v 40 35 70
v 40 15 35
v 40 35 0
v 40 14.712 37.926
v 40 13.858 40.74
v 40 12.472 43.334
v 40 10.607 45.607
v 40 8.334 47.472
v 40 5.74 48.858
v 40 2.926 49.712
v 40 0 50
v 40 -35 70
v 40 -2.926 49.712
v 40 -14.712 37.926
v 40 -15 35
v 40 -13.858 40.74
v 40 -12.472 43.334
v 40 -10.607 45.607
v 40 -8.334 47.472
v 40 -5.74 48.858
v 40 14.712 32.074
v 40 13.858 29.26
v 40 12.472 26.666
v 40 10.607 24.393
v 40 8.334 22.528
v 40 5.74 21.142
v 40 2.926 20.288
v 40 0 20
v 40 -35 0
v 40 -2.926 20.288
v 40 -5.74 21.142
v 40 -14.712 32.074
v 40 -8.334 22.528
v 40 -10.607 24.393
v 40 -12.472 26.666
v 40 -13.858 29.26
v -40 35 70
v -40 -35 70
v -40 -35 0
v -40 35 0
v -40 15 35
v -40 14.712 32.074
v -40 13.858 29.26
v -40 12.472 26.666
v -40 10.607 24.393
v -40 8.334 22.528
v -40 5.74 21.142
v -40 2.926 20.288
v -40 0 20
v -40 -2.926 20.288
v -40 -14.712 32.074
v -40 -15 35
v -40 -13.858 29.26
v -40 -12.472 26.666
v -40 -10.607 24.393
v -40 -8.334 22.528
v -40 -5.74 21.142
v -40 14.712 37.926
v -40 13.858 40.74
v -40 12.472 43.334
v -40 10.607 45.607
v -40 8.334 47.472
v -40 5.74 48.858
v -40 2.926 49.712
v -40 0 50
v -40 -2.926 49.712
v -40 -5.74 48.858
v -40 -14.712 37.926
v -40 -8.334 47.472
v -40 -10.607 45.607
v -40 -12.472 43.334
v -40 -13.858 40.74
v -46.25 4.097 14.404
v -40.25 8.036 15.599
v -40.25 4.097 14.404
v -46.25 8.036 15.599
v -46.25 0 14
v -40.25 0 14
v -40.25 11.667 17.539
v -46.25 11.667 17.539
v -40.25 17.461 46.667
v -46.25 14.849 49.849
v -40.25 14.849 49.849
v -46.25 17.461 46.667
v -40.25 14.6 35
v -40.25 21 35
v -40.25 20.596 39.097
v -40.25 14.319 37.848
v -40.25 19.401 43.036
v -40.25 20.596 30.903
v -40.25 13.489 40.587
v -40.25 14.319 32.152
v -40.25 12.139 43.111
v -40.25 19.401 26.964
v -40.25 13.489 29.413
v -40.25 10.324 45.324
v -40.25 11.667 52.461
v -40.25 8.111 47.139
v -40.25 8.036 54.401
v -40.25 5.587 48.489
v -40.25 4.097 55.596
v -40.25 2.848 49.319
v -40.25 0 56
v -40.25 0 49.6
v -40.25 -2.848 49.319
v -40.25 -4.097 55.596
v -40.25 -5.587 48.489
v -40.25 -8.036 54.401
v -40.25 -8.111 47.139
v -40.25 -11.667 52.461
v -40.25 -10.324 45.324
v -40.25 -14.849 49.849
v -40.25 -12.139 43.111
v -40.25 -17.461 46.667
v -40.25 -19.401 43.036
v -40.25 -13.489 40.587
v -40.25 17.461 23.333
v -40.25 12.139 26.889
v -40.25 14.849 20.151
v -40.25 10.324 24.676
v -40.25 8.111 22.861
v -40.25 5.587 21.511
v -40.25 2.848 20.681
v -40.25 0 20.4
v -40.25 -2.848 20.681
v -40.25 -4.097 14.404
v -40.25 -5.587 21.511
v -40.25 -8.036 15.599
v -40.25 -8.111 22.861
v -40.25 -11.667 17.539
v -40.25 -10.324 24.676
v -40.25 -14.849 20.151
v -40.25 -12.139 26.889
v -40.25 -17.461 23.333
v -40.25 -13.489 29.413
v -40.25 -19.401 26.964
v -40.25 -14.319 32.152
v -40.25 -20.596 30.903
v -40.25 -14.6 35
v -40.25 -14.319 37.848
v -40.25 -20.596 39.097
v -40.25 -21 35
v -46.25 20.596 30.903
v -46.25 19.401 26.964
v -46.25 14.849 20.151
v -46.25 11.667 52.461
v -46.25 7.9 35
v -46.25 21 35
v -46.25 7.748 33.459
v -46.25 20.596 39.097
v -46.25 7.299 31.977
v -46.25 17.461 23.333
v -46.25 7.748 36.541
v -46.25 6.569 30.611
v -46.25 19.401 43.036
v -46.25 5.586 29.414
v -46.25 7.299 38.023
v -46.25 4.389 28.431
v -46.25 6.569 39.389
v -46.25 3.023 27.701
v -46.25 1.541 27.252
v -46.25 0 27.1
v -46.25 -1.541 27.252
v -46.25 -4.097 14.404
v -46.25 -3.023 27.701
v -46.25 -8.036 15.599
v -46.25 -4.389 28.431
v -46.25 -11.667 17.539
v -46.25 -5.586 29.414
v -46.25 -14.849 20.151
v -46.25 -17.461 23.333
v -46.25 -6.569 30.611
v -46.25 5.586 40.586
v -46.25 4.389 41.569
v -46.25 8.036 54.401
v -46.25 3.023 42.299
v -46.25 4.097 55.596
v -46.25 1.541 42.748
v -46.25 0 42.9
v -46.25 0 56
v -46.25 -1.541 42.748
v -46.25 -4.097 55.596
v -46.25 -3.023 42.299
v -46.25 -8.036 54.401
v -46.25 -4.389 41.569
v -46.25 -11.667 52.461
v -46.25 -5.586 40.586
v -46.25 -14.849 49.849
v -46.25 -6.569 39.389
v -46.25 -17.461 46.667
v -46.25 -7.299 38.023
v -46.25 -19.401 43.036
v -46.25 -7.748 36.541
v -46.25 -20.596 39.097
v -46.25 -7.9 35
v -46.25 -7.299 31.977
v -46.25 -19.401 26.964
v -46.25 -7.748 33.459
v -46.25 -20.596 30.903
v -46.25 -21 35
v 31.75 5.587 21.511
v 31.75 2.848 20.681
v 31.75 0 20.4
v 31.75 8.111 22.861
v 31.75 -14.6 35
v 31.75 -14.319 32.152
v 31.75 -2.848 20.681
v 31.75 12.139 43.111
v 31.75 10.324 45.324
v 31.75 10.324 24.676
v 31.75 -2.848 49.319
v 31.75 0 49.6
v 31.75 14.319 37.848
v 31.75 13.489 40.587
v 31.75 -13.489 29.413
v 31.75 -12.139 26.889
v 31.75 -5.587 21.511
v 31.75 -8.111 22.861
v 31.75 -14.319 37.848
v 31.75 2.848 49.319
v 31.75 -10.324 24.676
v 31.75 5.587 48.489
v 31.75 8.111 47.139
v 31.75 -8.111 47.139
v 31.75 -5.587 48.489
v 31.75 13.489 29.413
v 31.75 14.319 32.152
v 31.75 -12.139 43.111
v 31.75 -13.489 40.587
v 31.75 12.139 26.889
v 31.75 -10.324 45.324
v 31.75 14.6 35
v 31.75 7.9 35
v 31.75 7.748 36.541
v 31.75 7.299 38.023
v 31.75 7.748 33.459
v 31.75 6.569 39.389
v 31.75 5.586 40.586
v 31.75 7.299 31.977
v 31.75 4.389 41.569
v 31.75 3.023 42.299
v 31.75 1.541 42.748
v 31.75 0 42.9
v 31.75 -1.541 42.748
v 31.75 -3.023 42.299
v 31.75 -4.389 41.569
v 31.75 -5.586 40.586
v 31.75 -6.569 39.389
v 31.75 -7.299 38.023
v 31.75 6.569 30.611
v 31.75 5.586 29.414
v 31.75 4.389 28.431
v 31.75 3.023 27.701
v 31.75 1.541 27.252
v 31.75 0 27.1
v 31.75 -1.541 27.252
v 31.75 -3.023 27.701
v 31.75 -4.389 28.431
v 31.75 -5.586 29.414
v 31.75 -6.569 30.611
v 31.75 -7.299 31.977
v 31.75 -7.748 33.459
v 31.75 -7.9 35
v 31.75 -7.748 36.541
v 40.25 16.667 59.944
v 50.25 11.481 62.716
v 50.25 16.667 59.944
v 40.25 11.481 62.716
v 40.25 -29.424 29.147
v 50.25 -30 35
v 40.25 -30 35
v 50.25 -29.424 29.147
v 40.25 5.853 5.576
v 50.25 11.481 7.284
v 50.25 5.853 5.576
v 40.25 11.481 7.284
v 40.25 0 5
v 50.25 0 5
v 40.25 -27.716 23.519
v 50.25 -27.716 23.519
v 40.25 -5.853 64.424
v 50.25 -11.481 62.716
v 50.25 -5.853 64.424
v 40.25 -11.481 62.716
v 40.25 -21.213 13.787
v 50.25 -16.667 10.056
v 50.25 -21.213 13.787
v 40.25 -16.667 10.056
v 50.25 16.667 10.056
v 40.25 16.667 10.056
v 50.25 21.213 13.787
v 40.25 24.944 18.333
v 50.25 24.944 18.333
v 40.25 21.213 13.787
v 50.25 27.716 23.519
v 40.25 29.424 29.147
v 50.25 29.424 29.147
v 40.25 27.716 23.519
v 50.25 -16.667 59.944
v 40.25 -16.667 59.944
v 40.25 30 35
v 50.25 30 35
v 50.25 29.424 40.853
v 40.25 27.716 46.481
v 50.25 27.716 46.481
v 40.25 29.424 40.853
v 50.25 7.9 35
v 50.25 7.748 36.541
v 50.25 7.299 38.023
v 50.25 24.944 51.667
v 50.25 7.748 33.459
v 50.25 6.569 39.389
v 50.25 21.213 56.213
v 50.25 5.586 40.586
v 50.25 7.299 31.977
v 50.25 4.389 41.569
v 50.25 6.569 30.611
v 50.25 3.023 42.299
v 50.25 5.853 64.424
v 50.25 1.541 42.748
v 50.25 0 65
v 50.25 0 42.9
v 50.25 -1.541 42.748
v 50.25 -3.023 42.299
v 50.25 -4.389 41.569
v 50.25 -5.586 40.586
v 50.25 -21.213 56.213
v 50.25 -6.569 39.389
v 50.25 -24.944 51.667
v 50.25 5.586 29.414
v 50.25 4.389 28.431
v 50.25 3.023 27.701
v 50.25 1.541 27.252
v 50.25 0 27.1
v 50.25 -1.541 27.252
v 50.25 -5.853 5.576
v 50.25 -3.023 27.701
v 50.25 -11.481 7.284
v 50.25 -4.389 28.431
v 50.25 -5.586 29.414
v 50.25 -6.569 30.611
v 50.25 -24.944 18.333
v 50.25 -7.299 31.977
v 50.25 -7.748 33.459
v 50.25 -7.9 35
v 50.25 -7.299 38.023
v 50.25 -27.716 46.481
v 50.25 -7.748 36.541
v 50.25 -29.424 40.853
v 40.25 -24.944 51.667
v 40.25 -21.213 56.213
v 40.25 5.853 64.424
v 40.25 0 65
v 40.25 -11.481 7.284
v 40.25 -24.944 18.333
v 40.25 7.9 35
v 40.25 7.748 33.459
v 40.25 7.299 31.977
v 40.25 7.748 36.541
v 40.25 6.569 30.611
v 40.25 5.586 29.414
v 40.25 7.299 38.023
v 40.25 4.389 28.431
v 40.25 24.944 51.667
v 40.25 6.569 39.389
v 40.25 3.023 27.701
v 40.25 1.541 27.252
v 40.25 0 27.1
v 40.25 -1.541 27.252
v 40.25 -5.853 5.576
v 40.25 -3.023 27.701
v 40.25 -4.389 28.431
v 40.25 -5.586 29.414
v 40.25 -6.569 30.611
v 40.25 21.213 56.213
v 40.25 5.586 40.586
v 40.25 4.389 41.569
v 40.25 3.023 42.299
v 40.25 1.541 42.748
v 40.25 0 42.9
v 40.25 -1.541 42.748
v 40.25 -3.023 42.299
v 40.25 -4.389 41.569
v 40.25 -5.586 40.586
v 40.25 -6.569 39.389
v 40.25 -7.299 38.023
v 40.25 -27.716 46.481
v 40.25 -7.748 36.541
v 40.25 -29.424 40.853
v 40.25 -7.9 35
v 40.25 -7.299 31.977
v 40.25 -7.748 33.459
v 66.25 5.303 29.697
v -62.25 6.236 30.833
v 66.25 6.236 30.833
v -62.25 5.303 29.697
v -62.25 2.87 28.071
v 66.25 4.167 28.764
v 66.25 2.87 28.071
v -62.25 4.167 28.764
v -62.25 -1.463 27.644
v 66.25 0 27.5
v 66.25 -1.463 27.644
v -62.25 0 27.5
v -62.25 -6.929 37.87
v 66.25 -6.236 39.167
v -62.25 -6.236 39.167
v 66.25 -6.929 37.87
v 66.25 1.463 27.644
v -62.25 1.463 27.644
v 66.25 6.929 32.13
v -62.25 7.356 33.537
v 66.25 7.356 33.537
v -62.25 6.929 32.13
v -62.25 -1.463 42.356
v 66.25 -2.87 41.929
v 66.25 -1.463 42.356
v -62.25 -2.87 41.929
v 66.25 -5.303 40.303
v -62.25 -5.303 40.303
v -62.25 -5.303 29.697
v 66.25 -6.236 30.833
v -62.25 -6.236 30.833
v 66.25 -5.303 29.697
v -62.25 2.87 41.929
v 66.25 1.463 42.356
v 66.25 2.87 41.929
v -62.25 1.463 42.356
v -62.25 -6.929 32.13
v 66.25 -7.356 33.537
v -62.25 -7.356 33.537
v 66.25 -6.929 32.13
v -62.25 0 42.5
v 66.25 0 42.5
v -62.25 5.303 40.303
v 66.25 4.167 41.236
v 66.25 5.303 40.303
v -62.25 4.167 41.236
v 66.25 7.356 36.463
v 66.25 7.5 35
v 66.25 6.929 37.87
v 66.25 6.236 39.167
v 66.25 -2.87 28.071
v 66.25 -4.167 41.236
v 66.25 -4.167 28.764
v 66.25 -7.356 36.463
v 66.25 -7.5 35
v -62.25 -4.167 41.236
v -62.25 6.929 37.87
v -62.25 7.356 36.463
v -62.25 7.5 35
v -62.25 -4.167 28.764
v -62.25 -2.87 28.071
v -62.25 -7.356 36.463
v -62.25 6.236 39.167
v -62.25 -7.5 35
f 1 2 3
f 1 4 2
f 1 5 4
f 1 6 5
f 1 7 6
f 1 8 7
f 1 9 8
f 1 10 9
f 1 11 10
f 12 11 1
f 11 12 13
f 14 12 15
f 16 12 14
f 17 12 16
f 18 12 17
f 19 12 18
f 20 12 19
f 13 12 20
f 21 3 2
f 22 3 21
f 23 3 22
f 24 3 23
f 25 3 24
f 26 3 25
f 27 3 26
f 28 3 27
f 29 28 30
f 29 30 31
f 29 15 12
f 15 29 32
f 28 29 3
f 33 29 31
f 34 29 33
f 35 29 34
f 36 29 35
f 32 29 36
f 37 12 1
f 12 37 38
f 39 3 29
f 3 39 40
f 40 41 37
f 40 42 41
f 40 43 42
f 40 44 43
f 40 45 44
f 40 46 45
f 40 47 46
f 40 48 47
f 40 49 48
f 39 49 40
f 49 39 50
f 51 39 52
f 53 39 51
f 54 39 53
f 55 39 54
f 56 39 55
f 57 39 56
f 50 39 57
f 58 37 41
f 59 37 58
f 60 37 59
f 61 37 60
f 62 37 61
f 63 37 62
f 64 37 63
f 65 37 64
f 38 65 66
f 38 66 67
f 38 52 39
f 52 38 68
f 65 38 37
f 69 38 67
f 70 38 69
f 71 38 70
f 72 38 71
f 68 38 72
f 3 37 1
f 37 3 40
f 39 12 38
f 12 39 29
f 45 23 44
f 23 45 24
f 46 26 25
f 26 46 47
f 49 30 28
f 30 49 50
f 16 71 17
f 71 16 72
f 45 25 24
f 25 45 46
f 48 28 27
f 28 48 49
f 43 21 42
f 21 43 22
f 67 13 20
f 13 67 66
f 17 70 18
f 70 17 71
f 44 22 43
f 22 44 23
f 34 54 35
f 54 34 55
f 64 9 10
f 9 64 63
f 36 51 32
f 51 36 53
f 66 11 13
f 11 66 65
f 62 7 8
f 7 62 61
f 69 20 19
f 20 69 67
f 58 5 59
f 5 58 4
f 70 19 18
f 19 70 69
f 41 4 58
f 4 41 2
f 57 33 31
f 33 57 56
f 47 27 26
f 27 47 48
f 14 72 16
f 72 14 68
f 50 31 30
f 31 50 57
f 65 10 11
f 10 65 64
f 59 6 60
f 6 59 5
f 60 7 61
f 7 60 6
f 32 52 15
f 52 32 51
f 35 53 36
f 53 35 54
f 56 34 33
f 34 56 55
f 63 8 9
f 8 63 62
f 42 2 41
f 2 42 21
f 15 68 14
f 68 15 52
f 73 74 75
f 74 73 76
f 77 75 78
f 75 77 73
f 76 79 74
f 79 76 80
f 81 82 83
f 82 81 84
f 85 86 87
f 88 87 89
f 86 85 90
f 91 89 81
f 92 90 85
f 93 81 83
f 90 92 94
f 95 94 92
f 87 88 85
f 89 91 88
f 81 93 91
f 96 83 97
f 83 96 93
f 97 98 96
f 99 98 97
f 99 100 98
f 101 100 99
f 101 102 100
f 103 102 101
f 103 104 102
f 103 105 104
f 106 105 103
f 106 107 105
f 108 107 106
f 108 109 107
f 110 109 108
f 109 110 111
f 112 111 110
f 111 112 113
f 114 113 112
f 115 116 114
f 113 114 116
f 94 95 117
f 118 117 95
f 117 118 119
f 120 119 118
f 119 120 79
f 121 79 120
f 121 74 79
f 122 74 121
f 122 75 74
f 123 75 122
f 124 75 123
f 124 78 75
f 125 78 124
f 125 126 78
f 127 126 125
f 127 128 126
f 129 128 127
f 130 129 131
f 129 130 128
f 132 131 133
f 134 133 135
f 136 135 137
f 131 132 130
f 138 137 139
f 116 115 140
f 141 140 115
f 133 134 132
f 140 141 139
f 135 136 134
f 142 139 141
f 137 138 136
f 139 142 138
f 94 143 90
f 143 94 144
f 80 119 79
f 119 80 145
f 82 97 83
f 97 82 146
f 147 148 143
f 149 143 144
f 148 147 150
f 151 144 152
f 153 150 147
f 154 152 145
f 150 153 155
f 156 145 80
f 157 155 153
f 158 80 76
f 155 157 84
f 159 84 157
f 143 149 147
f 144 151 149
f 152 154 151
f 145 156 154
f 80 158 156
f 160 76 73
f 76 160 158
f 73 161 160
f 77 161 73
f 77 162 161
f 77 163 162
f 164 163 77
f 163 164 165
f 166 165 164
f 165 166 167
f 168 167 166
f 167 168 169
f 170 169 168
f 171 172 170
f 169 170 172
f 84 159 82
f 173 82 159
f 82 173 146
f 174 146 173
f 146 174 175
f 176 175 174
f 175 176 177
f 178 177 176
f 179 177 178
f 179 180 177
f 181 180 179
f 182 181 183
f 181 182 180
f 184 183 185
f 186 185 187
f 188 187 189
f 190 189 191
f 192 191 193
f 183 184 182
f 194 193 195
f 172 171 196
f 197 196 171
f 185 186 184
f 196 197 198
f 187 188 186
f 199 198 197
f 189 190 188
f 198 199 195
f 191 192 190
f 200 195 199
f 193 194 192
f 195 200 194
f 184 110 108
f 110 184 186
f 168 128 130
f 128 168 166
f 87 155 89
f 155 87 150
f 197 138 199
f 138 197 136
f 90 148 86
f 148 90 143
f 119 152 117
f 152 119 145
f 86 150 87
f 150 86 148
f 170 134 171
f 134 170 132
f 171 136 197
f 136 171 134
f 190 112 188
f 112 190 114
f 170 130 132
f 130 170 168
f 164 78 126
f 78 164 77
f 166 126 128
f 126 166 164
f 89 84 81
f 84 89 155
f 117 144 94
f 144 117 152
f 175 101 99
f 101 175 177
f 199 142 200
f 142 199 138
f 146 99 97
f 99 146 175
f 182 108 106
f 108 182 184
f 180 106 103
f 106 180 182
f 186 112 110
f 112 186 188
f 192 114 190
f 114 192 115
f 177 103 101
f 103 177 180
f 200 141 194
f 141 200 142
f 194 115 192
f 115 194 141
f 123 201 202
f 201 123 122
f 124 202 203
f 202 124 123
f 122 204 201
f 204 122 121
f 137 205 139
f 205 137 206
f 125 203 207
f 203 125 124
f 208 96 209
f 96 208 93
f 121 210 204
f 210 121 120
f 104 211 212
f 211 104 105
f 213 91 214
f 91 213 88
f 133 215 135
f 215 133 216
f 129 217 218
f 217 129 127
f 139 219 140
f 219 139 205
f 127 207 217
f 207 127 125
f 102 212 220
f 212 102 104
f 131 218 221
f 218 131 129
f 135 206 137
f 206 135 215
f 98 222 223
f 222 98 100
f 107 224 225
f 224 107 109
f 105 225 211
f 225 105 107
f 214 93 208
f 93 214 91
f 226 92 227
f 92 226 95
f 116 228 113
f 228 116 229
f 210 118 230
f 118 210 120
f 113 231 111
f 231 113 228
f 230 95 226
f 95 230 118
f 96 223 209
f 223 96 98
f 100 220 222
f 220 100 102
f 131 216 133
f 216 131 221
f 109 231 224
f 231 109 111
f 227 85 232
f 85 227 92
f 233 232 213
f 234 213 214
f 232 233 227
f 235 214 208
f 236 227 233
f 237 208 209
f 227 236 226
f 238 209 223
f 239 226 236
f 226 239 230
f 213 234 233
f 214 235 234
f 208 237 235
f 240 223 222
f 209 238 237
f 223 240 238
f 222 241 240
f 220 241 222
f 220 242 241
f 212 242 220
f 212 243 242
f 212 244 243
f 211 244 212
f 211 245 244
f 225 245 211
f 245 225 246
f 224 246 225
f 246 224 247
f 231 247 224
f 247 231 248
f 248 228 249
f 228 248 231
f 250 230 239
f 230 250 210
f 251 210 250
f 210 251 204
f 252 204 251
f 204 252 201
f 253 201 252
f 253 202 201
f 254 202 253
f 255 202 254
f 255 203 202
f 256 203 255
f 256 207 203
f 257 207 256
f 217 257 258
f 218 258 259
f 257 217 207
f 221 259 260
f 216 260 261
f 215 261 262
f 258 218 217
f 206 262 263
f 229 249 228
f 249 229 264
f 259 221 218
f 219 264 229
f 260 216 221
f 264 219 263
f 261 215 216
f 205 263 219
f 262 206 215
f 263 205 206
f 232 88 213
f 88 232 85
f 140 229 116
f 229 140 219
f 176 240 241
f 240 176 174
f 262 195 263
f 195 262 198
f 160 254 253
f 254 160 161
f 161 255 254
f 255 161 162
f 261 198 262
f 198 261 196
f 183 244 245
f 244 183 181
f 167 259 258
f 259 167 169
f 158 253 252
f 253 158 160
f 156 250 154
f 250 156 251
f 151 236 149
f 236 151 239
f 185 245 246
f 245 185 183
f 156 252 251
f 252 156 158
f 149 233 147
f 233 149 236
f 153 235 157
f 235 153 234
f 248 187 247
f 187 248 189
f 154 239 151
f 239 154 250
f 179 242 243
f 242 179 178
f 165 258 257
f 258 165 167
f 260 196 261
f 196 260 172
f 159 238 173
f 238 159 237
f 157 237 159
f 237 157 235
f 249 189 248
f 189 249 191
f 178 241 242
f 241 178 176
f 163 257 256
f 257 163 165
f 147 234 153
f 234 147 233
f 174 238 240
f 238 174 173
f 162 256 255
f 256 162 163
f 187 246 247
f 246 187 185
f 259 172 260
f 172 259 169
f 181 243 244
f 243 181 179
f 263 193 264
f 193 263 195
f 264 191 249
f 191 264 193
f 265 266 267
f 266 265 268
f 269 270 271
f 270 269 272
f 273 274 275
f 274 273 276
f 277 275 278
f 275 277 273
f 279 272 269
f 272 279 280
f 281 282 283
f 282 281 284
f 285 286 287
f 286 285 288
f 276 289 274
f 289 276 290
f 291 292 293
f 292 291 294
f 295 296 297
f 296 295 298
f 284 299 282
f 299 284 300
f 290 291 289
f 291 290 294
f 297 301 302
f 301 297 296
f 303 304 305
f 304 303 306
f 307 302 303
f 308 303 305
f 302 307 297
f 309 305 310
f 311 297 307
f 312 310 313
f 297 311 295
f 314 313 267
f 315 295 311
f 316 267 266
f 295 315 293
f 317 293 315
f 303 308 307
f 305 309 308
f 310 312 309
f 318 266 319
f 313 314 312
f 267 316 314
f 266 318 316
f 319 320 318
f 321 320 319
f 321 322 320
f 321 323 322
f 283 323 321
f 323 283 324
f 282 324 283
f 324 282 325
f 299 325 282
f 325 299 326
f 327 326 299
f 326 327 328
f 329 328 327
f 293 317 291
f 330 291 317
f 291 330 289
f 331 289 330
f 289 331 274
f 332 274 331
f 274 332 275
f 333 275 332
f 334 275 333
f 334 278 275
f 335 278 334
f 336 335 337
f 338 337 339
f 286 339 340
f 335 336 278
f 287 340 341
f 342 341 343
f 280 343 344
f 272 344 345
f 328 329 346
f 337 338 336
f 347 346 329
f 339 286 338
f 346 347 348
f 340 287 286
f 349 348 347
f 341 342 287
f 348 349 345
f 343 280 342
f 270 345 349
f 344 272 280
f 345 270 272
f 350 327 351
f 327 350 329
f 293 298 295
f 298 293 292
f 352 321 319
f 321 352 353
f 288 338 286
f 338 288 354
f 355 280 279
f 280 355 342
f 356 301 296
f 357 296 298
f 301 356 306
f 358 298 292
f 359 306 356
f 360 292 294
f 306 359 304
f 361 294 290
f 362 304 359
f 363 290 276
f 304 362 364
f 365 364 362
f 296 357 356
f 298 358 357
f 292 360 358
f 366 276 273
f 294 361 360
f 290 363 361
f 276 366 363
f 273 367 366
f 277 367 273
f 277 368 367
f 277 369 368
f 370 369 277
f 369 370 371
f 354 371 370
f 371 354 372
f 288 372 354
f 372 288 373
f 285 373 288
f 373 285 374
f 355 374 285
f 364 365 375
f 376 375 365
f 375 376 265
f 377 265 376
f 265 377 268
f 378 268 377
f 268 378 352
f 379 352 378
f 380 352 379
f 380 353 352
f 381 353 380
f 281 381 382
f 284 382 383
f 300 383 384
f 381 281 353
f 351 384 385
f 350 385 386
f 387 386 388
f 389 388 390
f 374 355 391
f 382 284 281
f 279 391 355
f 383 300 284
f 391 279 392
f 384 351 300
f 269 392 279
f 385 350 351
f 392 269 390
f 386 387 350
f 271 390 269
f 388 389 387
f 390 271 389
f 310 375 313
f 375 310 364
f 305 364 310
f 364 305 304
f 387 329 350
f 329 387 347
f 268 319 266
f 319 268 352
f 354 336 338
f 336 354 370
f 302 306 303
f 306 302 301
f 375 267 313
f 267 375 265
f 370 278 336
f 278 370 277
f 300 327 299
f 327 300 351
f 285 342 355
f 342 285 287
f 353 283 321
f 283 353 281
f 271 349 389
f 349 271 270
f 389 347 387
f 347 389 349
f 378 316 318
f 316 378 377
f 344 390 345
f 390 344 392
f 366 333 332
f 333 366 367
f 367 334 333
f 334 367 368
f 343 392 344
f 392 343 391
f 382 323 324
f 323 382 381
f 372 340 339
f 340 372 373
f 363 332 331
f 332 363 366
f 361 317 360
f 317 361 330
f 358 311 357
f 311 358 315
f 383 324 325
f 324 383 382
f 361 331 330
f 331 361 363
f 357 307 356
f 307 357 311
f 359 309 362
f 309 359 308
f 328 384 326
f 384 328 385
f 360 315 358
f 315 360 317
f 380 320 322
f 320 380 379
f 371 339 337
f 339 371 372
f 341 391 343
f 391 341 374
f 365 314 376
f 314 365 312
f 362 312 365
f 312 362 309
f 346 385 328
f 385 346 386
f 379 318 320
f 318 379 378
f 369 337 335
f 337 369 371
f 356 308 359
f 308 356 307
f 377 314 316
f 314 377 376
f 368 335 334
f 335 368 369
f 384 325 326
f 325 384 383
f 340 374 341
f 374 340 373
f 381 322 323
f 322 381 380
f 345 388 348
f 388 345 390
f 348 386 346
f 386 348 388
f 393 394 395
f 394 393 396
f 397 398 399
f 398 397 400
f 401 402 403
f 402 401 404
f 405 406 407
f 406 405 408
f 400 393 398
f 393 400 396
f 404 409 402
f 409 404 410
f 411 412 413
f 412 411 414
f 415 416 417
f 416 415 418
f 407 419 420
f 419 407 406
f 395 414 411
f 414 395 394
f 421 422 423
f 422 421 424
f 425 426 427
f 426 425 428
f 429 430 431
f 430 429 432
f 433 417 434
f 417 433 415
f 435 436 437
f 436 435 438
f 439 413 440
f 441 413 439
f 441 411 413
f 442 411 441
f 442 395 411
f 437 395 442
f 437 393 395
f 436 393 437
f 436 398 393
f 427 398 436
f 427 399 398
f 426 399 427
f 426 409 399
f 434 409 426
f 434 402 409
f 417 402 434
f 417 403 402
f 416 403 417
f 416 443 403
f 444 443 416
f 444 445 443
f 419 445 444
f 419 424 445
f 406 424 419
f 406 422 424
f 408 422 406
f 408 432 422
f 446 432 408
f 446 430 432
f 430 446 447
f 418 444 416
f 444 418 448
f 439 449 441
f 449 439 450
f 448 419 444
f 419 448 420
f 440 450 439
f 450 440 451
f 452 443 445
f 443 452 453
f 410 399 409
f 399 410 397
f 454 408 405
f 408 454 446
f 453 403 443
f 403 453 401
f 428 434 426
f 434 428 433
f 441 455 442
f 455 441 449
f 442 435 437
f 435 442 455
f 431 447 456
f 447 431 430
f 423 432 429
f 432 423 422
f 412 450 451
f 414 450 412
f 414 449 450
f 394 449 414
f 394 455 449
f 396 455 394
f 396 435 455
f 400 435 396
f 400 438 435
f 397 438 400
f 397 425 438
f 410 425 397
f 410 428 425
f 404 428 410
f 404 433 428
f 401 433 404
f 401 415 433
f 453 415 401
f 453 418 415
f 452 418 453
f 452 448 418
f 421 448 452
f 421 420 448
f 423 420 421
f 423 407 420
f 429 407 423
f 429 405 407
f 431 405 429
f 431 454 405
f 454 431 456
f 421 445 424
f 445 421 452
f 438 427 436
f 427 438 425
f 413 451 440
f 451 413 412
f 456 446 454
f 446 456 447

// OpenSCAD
$fn = 32;

// ------------------------------------------------------------------------
// Bushed housing: 80 x 70 x 70 mm housing, bushing d29.2
// Every part is its own module, assembly() places them once.
// ------------------------------------------------------------------------

// --- part 1 ---
module housing() {
  difference() {
    translate([-40, -35, 0]) cube([80, 70, 70]);
    translate([0, 0, 35]) rotate([0, 90, 0]) cylinder(h = 82, d = 30, center = true);
  }
}

// --- part 2 ---
module bushing() {
  difference() {
    union() {
      cylinder(h = 6, d = 42);
      translate([0, 0, 6]) cylinder(h = 72, d = 29.2);
    }
    translate([0, 0, -1]) cylinder(h = 80, d = 15.8);
  }
}

// --- part 3 ---
module shaft() {
  translate([0, 0, -64.25]) cylinder(h = 128.5, d = 15);
}

// --- part 4 ---
module cover() {
  difference() {
    cylinder(h = 10, d = 60);
    translate([0, 0, -1]) cylinder(h = 12, d = 15.8);
  }
}

// --- assembly ---
module assembly() {
  translate([0, 0, 0]) rotate([0, 0, 0]) housing();
  translate([-46.25, 0, 35]) rotate([0, 90, 0]) bushing();
  translate([2, 0, 35]) rotate([0, 90, 0]) shaft();
  translate([40.25, 0, 35]) rotate([0, 90, 0]) cover();
}

assembly();
